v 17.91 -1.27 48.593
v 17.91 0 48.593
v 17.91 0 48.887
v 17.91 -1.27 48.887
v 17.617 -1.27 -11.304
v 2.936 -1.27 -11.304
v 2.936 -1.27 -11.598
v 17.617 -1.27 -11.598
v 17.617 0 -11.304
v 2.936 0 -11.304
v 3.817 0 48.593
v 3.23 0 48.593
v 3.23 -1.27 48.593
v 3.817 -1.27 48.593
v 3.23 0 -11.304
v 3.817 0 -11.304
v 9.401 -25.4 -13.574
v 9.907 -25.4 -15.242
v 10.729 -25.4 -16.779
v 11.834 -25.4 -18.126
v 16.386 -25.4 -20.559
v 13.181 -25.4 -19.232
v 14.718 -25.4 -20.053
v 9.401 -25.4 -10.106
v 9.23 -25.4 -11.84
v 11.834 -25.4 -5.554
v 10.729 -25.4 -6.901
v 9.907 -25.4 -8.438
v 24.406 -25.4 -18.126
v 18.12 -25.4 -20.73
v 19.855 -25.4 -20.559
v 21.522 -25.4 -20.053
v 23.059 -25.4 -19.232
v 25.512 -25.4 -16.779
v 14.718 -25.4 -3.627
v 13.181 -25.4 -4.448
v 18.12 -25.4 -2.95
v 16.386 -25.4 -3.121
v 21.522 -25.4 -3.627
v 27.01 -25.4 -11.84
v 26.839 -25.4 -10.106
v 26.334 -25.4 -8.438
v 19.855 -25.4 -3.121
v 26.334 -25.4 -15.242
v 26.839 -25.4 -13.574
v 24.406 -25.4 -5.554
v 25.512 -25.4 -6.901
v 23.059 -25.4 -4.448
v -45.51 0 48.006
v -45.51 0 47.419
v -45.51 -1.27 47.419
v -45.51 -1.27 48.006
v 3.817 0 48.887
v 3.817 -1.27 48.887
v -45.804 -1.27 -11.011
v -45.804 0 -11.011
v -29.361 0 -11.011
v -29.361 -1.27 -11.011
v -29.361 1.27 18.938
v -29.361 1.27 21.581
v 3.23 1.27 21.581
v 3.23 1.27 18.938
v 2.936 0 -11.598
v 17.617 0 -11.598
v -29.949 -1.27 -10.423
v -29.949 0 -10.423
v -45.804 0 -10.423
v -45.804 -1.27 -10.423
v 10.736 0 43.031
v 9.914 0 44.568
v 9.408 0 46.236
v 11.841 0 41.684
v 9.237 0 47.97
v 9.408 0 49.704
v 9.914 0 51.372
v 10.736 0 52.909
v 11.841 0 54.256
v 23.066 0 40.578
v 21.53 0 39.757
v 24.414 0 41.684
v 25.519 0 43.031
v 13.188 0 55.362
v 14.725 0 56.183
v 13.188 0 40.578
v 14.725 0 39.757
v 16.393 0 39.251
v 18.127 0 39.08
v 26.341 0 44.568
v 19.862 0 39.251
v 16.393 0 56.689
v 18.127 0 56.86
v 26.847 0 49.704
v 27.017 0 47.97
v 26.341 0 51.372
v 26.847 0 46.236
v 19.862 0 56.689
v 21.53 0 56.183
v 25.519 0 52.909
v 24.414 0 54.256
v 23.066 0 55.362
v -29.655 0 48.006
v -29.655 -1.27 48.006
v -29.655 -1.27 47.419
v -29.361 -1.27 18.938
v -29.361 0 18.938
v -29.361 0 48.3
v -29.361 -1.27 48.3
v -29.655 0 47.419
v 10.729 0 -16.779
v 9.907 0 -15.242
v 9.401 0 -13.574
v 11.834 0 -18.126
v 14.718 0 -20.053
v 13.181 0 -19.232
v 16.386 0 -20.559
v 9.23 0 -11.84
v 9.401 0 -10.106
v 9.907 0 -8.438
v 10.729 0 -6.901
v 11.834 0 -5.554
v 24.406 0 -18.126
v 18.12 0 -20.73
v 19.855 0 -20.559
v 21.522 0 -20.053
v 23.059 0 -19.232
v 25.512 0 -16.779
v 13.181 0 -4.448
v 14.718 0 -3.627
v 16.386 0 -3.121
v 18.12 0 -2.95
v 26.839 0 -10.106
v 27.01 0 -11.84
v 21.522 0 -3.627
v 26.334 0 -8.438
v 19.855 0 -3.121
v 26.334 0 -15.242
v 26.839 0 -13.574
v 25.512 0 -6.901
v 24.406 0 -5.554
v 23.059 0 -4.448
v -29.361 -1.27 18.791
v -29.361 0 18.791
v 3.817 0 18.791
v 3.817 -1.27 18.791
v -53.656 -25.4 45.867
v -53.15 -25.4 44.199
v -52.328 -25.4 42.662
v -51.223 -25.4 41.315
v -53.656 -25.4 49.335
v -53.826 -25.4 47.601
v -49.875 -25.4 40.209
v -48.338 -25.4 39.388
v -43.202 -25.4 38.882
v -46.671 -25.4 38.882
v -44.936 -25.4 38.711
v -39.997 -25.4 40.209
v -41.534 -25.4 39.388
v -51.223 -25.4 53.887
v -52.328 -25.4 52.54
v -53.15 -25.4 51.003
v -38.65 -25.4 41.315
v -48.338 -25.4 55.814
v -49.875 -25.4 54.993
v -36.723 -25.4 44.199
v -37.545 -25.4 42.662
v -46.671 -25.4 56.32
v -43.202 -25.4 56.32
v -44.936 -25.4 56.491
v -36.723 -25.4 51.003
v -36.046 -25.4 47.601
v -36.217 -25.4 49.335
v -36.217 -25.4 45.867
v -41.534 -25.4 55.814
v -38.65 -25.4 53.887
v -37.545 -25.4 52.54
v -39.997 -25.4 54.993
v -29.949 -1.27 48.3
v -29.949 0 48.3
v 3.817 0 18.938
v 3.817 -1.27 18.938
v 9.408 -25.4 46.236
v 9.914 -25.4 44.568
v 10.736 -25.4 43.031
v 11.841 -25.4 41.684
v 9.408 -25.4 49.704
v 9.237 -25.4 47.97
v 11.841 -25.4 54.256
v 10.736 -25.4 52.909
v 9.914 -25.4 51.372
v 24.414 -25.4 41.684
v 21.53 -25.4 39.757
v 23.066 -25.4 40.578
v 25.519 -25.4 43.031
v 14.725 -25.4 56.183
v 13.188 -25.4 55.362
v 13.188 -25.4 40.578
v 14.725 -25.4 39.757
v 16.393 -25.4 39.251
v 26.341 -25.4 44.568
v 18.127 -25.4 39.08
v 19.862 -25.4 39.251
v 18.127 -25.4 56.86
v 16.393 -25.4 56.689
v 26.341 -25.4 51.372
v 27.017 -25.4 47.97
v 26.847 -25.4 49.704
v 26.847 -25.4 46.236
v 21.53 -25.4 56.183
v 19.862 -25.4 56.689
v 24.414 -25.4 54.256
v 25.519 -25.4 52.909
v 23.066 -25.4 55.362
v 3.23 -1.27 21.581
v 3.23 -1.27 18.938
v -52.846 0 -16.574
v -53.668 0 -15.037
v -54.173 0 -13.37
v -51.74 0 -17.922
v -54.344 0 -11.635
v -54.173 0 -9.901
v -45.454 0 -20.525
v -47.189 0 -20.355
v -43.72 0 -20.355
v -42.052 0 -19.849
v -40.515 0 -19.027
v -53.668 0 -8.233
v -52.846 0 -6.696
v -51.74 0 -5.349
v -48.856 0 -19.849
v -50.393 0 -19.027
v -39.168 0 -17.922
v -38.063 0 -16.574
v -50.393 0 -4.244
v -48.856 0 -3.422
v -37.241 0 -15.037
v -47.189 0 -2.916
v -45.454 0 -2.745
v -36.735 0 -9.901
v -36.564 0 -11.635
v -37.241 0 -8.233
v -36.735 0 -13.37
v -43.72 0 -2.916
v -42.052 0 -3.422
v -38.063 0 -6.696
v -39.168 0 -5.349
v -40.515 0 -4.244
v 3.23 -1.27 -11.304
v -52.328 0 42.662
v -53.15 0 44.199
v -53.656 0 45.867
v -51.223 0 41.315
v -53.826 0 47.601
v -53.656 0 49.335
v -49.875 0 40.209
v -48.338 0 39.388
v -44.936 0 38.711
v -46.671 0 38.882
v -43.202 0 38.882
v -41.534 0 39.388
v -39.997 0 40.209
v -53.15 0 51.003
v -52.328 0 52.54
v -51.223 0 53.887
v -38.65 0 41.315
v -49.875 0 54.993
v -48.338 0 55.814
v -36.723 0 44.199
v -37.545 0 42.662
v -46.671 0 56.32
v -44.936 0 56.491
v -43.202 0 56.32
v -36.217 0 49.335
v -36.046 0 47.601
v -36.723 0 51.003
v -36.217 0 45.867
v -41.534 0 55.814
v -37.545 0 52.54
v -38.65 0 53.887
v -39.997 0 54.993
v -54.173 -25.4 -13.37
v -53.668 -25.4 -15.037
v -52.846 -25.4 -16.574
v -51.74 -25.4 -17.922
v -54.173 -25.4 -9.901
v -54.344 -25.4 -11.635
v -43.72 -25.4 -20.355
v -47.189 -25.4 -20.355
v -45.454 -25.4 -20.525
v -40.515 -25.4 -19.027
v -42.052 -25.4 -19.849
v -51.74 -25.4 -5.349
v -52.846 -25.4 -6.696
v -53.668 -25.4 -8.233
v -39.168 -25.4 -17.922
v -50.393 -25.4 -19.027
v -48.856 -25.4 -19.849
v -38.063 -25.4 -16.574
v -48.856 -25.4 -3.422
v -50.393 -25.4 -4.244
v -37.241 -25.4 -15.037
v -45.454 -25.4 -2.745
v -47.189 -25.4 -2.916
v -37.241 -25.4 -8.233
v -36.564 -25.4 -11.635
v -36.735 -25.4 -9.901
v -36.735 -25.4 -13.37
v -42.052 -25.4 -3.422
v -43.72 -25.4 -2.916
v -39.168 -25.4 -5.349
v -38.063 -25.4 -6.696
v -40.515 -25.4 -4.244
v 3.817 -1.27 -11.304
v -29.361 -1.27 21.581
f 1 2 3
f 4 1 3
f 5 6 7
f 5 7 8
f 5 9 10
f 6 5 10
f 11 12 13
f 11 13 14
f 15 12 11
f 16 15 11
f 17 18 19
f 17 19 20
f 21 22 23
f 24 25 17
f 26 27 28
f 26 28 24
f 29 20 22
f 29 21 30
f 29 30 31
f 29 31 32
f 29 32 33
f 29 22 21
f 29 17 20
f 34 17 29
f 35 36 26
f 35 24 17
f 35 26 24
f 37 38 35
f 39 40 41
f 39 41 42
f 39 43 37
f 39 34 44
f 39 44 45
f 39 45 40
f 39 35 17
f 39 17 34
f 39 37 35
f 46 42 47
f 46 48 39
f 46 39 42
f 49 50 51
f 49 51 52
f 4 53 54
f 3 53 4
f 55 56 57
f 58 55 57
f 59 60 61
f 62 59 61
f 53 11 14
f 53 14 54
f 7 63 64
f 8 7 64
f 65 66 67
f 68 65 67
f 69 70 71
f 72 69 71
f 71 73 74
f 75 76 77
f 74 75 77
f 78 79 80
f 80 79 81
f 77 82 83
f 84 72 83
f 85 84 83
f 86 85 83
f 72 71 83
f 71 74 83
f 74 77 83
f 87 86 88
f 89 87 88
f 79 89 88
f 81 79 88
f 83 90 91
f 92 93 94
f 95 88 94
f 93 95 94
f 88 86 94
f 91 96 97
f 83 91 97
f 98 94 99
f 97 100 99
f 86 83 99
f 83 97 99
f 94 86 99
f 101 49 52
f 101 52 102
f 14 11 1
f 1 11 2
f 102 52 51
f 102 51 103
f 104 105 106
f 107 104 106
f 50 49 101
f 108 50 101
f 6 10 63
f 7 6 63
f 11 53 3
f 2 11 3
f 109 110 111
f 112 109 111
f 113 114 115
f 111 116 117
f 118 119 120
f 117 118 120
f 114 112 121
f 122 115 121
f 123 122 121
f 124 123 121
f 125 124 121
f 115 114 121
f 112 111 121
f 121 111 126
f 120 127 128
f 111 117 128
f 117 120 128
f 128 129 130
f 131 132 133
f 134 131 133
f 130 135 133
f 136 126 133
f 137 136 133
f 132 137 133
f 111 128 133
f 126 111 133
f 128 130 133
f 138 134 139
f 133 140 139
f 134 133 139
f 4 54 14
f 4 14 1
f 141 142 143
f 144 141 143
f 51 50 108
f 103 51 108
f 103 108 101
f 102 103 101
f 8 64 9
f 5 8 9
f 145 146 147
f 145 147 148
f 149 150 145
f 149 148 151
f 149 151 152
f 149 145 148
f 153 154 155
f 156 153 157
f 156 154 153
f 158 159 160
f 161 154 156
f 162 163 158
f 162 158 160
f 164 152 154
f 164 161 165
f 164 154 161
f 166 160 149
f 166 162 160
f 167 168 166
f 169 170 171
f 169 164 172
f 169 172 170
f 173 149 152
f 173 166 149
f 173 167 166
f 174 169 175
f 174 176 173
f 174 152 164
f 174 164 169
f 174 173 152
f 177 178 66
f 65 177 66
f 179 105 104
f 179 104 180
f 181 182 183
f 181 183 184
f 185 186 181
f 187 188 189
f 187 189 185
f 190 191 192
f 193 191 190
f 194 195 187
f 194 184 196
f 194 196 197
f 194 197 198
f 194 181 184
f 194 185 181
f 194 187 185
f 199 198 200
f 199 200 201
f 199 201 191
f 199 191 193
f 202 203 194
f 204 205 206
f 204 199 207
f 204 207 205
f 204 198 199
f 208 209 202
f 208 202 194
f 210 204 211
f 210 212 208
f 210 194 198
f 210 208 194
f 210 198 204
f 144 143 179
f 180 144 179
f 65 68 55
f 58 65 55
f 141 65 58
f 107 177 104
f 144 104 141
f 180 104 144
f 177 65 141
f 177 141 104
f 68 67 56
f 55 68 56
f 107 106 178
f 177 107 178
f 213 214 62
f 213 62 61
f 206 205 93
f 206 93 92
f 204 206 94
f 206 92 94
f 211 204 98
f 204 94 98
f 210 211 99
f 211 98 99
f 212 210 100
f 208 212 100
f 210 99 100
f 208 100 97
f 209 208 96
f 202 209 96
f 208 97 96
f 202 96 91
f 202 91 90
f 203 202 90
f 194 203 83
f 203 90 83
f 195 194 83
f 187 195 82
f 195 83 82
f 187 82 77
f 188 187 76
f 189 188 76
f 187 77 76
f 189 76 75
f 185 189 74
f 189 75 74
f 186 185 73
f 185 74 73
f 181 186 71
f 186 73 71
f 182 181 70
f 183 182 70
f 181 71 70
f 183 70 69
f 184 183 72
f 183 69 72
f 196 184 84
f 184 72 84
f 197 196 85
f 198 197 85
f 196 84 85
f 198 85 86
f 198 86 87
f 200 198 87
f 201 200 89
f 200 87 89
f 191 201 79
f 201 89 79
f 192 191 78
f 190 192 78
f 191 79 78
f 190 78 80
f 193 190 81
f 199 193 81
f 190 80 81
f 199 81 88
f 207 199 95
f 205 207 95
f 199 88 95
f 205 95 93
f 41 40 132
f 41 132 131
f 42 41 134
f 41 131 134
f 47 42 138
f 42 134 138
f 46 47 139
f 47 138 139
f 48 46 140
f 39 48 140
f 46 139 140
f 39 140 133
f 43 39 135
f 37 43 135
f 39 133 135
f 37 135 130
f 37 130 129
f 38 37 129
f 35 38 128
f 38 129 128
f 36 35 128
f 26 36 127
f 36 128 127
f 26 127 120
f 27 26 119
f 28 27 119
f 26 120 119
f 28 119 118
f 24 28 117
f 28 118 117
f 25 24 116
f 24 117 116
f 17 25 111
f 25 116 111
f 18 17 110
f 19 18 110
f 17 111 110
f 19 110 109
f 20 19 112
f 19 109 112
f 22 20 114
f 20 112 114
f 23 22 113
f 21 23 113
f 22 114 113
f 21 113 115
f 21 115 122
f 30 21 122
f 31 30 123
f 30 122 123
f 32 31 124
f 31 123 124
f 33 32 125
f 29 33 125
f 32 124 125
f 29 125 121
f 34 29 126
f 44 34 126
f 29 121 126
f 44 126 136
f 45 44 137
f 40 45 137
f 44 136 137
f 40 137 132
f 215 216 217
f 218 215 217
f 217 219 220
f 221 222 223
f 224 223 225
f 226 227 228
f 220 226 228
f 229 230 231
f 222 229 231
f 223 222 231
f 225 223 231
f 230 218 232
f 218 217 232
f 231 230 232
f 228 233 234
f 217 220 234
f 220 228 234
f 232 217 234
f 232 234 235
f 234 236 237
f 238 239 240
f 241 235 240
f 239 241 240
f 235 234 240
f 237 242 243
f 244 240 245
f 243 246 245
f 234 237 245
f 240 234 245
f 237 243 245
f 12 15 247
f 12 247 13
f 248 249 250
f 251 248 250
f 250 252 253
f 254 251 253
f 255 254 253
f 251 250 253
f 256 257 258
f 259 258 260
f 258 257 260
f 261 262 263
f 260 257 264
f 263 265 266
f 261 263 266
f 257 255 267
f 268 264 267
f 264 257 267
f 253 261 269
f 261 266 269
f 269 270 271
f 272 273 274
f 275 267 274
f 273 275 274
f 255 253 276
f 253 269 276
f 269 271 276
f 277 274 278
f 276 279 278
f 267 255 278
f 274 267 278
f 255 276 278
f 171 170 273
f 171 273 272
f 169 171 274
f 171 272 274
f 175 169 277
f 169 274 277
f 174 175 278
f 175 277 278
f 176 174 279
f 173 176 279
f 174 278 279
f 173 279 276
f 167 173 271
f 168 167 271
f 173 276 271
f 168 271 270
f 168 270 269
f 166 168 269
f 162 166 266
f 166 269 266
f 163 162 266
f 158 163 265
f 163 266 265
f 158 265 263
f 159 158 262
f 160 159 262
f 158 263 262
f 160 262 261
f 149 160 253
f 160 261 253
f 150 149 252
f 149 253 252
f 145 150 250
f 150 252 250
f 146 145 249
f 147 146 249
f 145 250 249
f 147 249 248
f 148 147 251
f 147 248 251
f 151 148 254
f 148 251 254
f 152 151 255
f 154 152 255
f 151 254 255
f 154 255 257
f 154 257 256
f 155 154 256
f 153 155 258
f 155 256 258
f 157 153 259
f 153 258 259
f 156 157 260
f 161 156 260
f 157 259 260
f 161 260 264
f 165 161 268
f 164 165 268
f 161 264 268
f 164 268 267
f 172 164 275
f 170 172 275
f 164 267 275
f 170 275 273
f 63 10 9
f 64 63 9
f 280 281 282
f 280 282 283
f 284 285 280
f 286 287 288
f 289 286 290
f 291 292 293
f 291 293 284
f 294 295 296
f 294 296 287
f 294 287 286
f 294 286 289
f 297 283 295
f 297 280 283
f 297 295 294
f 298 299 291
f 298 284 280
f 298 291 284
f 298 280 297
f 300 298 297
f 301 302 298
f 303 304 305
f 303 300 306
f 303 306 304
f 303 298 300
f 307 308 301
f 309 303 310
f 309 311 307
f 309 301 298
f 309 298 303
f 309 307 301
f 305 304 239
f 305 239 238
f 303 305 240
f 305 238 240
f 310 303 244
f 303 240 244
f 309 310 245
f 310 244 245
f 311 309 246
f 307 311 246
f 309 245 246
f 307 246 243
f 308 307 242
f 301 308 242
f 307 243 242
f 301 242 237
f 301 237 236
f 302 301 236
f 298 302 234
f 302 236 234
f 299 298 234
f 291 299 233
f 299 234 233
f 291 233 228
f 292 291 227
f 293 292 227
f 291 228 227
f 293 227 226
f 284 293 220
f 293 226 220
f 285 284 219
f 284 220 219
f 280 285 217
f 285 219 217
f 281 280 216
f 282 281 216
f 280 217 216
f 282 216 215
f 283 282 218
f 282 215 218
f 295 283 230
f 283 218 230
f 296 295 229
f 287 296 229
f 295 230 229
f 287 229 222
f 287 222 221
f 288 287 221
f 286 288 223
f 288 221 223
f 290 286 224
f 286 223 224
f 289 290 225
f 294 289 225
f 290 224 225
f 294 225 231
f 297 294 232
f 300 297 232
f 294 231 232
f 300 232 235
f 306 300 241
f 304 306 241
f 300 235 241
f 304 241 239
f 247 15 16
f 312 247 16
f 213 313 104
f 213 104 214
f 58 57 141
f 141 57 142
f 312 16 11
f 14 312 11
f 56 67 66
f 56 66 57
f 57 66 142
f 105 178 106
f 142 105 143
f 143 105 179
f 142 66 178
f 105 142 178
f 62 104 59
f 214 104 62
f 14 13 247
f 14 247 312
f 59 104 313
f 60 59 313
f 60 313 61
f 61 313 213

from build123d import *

# Parameters (mm, degrees)
F0_R          = 8.89
F1_DEPTH      = 25.4
F2_W          = 14.093503
F2_H          = 0.293616
F2_W_2        = 33.17846
F2_H_2        = 0.146806
F3_DEPTH      = 1.27
F4_W          = 15.855191
F4_H          = 0.587233
F4_W_2        = 0.587229
F4_H_2        = 59.897396
F5_DEPTH      = 1.27
F6_W          = 32.591231
F6_H          = 2.64253
F7_DEPTH      = 1.27
F7_DEPTH_BACK = 1.27


with BuildPart() as f1:
    # F0 (on Front) → F1 (new body)
    with BuildSketch(Plane.XZ):
        with Locations((-44.936354, 47.600865)):
            Circle(F0_R)
        with Locations((18.127472, 47.970025)):
            Circle(F0_R)
        with Locations((-45.454281, -11.635401)):
            Circle(F0_R)
        with Locations((18.120287, -11.839913)):
            Circle(F0_R)
    extrude(amount=F1_DEPTH)


with BuildPart() as f3:
    # F2 (on Front) → F3 (new body)
    with BuildSketch(Plane.XZ):
        Polygon((-45.80389, -10.423321), (-45.80389, -11.010551), (-29.361468, -11.010551), (-29.361468, -10.423321), (-29.948698, -10.423321), align=None)
        with Locations((10.863743, 48.740039)):
            Rectangle(F2_W, F2_H)
        Polygon((17.616881, -11.304165), (3.816992, -11.304165), (2.936148, -11.304165), (2.936148, -11.597781), (17.616881, -11.597781), align=None)
        Polygon((-29.948698, -10.423321), (-29.361468, -10.423321), (-29.361468, 18.791341), (-29.361468, 18.938147), (-29.361468, 48.299614), (-29.948698, 48.299614), align=None)
        with Locations((-12.772238, 18.864744)):
            Rectangle(F2_W_2, F2_H_2)
    extrude(amount=F3_DEPTH)


with BuildPart() as f5:
    # F4 (on Front) → F5 (new body)
    with BuildSketch(Plane.XZ):
        with Locations((-37.582678, 47.712385)):
            Rectangle(F4_W, F4_H)
        with Locations((3.523378, 18.644533)):
            Rectangle(F4_W_2, F4_H_2)
    extrude(amount=F5_DEPTH)


with BuildPart() as f7:
    # F6 (on Front) → F7 (new body, two sides)
    with BuildSketch(Plane.XZ) as f7_sk:
        with Locations((-13.065853, 20.259412)):
            Rectangle(F6_W, F6_H)
    extrude(amount=F7_DEPTH)
    extrude(f7_sk.sketch, amount=-F7_DEPTH_BACK)


solid = Compound([f1.part, f3.part, f5.part, f7.part])
